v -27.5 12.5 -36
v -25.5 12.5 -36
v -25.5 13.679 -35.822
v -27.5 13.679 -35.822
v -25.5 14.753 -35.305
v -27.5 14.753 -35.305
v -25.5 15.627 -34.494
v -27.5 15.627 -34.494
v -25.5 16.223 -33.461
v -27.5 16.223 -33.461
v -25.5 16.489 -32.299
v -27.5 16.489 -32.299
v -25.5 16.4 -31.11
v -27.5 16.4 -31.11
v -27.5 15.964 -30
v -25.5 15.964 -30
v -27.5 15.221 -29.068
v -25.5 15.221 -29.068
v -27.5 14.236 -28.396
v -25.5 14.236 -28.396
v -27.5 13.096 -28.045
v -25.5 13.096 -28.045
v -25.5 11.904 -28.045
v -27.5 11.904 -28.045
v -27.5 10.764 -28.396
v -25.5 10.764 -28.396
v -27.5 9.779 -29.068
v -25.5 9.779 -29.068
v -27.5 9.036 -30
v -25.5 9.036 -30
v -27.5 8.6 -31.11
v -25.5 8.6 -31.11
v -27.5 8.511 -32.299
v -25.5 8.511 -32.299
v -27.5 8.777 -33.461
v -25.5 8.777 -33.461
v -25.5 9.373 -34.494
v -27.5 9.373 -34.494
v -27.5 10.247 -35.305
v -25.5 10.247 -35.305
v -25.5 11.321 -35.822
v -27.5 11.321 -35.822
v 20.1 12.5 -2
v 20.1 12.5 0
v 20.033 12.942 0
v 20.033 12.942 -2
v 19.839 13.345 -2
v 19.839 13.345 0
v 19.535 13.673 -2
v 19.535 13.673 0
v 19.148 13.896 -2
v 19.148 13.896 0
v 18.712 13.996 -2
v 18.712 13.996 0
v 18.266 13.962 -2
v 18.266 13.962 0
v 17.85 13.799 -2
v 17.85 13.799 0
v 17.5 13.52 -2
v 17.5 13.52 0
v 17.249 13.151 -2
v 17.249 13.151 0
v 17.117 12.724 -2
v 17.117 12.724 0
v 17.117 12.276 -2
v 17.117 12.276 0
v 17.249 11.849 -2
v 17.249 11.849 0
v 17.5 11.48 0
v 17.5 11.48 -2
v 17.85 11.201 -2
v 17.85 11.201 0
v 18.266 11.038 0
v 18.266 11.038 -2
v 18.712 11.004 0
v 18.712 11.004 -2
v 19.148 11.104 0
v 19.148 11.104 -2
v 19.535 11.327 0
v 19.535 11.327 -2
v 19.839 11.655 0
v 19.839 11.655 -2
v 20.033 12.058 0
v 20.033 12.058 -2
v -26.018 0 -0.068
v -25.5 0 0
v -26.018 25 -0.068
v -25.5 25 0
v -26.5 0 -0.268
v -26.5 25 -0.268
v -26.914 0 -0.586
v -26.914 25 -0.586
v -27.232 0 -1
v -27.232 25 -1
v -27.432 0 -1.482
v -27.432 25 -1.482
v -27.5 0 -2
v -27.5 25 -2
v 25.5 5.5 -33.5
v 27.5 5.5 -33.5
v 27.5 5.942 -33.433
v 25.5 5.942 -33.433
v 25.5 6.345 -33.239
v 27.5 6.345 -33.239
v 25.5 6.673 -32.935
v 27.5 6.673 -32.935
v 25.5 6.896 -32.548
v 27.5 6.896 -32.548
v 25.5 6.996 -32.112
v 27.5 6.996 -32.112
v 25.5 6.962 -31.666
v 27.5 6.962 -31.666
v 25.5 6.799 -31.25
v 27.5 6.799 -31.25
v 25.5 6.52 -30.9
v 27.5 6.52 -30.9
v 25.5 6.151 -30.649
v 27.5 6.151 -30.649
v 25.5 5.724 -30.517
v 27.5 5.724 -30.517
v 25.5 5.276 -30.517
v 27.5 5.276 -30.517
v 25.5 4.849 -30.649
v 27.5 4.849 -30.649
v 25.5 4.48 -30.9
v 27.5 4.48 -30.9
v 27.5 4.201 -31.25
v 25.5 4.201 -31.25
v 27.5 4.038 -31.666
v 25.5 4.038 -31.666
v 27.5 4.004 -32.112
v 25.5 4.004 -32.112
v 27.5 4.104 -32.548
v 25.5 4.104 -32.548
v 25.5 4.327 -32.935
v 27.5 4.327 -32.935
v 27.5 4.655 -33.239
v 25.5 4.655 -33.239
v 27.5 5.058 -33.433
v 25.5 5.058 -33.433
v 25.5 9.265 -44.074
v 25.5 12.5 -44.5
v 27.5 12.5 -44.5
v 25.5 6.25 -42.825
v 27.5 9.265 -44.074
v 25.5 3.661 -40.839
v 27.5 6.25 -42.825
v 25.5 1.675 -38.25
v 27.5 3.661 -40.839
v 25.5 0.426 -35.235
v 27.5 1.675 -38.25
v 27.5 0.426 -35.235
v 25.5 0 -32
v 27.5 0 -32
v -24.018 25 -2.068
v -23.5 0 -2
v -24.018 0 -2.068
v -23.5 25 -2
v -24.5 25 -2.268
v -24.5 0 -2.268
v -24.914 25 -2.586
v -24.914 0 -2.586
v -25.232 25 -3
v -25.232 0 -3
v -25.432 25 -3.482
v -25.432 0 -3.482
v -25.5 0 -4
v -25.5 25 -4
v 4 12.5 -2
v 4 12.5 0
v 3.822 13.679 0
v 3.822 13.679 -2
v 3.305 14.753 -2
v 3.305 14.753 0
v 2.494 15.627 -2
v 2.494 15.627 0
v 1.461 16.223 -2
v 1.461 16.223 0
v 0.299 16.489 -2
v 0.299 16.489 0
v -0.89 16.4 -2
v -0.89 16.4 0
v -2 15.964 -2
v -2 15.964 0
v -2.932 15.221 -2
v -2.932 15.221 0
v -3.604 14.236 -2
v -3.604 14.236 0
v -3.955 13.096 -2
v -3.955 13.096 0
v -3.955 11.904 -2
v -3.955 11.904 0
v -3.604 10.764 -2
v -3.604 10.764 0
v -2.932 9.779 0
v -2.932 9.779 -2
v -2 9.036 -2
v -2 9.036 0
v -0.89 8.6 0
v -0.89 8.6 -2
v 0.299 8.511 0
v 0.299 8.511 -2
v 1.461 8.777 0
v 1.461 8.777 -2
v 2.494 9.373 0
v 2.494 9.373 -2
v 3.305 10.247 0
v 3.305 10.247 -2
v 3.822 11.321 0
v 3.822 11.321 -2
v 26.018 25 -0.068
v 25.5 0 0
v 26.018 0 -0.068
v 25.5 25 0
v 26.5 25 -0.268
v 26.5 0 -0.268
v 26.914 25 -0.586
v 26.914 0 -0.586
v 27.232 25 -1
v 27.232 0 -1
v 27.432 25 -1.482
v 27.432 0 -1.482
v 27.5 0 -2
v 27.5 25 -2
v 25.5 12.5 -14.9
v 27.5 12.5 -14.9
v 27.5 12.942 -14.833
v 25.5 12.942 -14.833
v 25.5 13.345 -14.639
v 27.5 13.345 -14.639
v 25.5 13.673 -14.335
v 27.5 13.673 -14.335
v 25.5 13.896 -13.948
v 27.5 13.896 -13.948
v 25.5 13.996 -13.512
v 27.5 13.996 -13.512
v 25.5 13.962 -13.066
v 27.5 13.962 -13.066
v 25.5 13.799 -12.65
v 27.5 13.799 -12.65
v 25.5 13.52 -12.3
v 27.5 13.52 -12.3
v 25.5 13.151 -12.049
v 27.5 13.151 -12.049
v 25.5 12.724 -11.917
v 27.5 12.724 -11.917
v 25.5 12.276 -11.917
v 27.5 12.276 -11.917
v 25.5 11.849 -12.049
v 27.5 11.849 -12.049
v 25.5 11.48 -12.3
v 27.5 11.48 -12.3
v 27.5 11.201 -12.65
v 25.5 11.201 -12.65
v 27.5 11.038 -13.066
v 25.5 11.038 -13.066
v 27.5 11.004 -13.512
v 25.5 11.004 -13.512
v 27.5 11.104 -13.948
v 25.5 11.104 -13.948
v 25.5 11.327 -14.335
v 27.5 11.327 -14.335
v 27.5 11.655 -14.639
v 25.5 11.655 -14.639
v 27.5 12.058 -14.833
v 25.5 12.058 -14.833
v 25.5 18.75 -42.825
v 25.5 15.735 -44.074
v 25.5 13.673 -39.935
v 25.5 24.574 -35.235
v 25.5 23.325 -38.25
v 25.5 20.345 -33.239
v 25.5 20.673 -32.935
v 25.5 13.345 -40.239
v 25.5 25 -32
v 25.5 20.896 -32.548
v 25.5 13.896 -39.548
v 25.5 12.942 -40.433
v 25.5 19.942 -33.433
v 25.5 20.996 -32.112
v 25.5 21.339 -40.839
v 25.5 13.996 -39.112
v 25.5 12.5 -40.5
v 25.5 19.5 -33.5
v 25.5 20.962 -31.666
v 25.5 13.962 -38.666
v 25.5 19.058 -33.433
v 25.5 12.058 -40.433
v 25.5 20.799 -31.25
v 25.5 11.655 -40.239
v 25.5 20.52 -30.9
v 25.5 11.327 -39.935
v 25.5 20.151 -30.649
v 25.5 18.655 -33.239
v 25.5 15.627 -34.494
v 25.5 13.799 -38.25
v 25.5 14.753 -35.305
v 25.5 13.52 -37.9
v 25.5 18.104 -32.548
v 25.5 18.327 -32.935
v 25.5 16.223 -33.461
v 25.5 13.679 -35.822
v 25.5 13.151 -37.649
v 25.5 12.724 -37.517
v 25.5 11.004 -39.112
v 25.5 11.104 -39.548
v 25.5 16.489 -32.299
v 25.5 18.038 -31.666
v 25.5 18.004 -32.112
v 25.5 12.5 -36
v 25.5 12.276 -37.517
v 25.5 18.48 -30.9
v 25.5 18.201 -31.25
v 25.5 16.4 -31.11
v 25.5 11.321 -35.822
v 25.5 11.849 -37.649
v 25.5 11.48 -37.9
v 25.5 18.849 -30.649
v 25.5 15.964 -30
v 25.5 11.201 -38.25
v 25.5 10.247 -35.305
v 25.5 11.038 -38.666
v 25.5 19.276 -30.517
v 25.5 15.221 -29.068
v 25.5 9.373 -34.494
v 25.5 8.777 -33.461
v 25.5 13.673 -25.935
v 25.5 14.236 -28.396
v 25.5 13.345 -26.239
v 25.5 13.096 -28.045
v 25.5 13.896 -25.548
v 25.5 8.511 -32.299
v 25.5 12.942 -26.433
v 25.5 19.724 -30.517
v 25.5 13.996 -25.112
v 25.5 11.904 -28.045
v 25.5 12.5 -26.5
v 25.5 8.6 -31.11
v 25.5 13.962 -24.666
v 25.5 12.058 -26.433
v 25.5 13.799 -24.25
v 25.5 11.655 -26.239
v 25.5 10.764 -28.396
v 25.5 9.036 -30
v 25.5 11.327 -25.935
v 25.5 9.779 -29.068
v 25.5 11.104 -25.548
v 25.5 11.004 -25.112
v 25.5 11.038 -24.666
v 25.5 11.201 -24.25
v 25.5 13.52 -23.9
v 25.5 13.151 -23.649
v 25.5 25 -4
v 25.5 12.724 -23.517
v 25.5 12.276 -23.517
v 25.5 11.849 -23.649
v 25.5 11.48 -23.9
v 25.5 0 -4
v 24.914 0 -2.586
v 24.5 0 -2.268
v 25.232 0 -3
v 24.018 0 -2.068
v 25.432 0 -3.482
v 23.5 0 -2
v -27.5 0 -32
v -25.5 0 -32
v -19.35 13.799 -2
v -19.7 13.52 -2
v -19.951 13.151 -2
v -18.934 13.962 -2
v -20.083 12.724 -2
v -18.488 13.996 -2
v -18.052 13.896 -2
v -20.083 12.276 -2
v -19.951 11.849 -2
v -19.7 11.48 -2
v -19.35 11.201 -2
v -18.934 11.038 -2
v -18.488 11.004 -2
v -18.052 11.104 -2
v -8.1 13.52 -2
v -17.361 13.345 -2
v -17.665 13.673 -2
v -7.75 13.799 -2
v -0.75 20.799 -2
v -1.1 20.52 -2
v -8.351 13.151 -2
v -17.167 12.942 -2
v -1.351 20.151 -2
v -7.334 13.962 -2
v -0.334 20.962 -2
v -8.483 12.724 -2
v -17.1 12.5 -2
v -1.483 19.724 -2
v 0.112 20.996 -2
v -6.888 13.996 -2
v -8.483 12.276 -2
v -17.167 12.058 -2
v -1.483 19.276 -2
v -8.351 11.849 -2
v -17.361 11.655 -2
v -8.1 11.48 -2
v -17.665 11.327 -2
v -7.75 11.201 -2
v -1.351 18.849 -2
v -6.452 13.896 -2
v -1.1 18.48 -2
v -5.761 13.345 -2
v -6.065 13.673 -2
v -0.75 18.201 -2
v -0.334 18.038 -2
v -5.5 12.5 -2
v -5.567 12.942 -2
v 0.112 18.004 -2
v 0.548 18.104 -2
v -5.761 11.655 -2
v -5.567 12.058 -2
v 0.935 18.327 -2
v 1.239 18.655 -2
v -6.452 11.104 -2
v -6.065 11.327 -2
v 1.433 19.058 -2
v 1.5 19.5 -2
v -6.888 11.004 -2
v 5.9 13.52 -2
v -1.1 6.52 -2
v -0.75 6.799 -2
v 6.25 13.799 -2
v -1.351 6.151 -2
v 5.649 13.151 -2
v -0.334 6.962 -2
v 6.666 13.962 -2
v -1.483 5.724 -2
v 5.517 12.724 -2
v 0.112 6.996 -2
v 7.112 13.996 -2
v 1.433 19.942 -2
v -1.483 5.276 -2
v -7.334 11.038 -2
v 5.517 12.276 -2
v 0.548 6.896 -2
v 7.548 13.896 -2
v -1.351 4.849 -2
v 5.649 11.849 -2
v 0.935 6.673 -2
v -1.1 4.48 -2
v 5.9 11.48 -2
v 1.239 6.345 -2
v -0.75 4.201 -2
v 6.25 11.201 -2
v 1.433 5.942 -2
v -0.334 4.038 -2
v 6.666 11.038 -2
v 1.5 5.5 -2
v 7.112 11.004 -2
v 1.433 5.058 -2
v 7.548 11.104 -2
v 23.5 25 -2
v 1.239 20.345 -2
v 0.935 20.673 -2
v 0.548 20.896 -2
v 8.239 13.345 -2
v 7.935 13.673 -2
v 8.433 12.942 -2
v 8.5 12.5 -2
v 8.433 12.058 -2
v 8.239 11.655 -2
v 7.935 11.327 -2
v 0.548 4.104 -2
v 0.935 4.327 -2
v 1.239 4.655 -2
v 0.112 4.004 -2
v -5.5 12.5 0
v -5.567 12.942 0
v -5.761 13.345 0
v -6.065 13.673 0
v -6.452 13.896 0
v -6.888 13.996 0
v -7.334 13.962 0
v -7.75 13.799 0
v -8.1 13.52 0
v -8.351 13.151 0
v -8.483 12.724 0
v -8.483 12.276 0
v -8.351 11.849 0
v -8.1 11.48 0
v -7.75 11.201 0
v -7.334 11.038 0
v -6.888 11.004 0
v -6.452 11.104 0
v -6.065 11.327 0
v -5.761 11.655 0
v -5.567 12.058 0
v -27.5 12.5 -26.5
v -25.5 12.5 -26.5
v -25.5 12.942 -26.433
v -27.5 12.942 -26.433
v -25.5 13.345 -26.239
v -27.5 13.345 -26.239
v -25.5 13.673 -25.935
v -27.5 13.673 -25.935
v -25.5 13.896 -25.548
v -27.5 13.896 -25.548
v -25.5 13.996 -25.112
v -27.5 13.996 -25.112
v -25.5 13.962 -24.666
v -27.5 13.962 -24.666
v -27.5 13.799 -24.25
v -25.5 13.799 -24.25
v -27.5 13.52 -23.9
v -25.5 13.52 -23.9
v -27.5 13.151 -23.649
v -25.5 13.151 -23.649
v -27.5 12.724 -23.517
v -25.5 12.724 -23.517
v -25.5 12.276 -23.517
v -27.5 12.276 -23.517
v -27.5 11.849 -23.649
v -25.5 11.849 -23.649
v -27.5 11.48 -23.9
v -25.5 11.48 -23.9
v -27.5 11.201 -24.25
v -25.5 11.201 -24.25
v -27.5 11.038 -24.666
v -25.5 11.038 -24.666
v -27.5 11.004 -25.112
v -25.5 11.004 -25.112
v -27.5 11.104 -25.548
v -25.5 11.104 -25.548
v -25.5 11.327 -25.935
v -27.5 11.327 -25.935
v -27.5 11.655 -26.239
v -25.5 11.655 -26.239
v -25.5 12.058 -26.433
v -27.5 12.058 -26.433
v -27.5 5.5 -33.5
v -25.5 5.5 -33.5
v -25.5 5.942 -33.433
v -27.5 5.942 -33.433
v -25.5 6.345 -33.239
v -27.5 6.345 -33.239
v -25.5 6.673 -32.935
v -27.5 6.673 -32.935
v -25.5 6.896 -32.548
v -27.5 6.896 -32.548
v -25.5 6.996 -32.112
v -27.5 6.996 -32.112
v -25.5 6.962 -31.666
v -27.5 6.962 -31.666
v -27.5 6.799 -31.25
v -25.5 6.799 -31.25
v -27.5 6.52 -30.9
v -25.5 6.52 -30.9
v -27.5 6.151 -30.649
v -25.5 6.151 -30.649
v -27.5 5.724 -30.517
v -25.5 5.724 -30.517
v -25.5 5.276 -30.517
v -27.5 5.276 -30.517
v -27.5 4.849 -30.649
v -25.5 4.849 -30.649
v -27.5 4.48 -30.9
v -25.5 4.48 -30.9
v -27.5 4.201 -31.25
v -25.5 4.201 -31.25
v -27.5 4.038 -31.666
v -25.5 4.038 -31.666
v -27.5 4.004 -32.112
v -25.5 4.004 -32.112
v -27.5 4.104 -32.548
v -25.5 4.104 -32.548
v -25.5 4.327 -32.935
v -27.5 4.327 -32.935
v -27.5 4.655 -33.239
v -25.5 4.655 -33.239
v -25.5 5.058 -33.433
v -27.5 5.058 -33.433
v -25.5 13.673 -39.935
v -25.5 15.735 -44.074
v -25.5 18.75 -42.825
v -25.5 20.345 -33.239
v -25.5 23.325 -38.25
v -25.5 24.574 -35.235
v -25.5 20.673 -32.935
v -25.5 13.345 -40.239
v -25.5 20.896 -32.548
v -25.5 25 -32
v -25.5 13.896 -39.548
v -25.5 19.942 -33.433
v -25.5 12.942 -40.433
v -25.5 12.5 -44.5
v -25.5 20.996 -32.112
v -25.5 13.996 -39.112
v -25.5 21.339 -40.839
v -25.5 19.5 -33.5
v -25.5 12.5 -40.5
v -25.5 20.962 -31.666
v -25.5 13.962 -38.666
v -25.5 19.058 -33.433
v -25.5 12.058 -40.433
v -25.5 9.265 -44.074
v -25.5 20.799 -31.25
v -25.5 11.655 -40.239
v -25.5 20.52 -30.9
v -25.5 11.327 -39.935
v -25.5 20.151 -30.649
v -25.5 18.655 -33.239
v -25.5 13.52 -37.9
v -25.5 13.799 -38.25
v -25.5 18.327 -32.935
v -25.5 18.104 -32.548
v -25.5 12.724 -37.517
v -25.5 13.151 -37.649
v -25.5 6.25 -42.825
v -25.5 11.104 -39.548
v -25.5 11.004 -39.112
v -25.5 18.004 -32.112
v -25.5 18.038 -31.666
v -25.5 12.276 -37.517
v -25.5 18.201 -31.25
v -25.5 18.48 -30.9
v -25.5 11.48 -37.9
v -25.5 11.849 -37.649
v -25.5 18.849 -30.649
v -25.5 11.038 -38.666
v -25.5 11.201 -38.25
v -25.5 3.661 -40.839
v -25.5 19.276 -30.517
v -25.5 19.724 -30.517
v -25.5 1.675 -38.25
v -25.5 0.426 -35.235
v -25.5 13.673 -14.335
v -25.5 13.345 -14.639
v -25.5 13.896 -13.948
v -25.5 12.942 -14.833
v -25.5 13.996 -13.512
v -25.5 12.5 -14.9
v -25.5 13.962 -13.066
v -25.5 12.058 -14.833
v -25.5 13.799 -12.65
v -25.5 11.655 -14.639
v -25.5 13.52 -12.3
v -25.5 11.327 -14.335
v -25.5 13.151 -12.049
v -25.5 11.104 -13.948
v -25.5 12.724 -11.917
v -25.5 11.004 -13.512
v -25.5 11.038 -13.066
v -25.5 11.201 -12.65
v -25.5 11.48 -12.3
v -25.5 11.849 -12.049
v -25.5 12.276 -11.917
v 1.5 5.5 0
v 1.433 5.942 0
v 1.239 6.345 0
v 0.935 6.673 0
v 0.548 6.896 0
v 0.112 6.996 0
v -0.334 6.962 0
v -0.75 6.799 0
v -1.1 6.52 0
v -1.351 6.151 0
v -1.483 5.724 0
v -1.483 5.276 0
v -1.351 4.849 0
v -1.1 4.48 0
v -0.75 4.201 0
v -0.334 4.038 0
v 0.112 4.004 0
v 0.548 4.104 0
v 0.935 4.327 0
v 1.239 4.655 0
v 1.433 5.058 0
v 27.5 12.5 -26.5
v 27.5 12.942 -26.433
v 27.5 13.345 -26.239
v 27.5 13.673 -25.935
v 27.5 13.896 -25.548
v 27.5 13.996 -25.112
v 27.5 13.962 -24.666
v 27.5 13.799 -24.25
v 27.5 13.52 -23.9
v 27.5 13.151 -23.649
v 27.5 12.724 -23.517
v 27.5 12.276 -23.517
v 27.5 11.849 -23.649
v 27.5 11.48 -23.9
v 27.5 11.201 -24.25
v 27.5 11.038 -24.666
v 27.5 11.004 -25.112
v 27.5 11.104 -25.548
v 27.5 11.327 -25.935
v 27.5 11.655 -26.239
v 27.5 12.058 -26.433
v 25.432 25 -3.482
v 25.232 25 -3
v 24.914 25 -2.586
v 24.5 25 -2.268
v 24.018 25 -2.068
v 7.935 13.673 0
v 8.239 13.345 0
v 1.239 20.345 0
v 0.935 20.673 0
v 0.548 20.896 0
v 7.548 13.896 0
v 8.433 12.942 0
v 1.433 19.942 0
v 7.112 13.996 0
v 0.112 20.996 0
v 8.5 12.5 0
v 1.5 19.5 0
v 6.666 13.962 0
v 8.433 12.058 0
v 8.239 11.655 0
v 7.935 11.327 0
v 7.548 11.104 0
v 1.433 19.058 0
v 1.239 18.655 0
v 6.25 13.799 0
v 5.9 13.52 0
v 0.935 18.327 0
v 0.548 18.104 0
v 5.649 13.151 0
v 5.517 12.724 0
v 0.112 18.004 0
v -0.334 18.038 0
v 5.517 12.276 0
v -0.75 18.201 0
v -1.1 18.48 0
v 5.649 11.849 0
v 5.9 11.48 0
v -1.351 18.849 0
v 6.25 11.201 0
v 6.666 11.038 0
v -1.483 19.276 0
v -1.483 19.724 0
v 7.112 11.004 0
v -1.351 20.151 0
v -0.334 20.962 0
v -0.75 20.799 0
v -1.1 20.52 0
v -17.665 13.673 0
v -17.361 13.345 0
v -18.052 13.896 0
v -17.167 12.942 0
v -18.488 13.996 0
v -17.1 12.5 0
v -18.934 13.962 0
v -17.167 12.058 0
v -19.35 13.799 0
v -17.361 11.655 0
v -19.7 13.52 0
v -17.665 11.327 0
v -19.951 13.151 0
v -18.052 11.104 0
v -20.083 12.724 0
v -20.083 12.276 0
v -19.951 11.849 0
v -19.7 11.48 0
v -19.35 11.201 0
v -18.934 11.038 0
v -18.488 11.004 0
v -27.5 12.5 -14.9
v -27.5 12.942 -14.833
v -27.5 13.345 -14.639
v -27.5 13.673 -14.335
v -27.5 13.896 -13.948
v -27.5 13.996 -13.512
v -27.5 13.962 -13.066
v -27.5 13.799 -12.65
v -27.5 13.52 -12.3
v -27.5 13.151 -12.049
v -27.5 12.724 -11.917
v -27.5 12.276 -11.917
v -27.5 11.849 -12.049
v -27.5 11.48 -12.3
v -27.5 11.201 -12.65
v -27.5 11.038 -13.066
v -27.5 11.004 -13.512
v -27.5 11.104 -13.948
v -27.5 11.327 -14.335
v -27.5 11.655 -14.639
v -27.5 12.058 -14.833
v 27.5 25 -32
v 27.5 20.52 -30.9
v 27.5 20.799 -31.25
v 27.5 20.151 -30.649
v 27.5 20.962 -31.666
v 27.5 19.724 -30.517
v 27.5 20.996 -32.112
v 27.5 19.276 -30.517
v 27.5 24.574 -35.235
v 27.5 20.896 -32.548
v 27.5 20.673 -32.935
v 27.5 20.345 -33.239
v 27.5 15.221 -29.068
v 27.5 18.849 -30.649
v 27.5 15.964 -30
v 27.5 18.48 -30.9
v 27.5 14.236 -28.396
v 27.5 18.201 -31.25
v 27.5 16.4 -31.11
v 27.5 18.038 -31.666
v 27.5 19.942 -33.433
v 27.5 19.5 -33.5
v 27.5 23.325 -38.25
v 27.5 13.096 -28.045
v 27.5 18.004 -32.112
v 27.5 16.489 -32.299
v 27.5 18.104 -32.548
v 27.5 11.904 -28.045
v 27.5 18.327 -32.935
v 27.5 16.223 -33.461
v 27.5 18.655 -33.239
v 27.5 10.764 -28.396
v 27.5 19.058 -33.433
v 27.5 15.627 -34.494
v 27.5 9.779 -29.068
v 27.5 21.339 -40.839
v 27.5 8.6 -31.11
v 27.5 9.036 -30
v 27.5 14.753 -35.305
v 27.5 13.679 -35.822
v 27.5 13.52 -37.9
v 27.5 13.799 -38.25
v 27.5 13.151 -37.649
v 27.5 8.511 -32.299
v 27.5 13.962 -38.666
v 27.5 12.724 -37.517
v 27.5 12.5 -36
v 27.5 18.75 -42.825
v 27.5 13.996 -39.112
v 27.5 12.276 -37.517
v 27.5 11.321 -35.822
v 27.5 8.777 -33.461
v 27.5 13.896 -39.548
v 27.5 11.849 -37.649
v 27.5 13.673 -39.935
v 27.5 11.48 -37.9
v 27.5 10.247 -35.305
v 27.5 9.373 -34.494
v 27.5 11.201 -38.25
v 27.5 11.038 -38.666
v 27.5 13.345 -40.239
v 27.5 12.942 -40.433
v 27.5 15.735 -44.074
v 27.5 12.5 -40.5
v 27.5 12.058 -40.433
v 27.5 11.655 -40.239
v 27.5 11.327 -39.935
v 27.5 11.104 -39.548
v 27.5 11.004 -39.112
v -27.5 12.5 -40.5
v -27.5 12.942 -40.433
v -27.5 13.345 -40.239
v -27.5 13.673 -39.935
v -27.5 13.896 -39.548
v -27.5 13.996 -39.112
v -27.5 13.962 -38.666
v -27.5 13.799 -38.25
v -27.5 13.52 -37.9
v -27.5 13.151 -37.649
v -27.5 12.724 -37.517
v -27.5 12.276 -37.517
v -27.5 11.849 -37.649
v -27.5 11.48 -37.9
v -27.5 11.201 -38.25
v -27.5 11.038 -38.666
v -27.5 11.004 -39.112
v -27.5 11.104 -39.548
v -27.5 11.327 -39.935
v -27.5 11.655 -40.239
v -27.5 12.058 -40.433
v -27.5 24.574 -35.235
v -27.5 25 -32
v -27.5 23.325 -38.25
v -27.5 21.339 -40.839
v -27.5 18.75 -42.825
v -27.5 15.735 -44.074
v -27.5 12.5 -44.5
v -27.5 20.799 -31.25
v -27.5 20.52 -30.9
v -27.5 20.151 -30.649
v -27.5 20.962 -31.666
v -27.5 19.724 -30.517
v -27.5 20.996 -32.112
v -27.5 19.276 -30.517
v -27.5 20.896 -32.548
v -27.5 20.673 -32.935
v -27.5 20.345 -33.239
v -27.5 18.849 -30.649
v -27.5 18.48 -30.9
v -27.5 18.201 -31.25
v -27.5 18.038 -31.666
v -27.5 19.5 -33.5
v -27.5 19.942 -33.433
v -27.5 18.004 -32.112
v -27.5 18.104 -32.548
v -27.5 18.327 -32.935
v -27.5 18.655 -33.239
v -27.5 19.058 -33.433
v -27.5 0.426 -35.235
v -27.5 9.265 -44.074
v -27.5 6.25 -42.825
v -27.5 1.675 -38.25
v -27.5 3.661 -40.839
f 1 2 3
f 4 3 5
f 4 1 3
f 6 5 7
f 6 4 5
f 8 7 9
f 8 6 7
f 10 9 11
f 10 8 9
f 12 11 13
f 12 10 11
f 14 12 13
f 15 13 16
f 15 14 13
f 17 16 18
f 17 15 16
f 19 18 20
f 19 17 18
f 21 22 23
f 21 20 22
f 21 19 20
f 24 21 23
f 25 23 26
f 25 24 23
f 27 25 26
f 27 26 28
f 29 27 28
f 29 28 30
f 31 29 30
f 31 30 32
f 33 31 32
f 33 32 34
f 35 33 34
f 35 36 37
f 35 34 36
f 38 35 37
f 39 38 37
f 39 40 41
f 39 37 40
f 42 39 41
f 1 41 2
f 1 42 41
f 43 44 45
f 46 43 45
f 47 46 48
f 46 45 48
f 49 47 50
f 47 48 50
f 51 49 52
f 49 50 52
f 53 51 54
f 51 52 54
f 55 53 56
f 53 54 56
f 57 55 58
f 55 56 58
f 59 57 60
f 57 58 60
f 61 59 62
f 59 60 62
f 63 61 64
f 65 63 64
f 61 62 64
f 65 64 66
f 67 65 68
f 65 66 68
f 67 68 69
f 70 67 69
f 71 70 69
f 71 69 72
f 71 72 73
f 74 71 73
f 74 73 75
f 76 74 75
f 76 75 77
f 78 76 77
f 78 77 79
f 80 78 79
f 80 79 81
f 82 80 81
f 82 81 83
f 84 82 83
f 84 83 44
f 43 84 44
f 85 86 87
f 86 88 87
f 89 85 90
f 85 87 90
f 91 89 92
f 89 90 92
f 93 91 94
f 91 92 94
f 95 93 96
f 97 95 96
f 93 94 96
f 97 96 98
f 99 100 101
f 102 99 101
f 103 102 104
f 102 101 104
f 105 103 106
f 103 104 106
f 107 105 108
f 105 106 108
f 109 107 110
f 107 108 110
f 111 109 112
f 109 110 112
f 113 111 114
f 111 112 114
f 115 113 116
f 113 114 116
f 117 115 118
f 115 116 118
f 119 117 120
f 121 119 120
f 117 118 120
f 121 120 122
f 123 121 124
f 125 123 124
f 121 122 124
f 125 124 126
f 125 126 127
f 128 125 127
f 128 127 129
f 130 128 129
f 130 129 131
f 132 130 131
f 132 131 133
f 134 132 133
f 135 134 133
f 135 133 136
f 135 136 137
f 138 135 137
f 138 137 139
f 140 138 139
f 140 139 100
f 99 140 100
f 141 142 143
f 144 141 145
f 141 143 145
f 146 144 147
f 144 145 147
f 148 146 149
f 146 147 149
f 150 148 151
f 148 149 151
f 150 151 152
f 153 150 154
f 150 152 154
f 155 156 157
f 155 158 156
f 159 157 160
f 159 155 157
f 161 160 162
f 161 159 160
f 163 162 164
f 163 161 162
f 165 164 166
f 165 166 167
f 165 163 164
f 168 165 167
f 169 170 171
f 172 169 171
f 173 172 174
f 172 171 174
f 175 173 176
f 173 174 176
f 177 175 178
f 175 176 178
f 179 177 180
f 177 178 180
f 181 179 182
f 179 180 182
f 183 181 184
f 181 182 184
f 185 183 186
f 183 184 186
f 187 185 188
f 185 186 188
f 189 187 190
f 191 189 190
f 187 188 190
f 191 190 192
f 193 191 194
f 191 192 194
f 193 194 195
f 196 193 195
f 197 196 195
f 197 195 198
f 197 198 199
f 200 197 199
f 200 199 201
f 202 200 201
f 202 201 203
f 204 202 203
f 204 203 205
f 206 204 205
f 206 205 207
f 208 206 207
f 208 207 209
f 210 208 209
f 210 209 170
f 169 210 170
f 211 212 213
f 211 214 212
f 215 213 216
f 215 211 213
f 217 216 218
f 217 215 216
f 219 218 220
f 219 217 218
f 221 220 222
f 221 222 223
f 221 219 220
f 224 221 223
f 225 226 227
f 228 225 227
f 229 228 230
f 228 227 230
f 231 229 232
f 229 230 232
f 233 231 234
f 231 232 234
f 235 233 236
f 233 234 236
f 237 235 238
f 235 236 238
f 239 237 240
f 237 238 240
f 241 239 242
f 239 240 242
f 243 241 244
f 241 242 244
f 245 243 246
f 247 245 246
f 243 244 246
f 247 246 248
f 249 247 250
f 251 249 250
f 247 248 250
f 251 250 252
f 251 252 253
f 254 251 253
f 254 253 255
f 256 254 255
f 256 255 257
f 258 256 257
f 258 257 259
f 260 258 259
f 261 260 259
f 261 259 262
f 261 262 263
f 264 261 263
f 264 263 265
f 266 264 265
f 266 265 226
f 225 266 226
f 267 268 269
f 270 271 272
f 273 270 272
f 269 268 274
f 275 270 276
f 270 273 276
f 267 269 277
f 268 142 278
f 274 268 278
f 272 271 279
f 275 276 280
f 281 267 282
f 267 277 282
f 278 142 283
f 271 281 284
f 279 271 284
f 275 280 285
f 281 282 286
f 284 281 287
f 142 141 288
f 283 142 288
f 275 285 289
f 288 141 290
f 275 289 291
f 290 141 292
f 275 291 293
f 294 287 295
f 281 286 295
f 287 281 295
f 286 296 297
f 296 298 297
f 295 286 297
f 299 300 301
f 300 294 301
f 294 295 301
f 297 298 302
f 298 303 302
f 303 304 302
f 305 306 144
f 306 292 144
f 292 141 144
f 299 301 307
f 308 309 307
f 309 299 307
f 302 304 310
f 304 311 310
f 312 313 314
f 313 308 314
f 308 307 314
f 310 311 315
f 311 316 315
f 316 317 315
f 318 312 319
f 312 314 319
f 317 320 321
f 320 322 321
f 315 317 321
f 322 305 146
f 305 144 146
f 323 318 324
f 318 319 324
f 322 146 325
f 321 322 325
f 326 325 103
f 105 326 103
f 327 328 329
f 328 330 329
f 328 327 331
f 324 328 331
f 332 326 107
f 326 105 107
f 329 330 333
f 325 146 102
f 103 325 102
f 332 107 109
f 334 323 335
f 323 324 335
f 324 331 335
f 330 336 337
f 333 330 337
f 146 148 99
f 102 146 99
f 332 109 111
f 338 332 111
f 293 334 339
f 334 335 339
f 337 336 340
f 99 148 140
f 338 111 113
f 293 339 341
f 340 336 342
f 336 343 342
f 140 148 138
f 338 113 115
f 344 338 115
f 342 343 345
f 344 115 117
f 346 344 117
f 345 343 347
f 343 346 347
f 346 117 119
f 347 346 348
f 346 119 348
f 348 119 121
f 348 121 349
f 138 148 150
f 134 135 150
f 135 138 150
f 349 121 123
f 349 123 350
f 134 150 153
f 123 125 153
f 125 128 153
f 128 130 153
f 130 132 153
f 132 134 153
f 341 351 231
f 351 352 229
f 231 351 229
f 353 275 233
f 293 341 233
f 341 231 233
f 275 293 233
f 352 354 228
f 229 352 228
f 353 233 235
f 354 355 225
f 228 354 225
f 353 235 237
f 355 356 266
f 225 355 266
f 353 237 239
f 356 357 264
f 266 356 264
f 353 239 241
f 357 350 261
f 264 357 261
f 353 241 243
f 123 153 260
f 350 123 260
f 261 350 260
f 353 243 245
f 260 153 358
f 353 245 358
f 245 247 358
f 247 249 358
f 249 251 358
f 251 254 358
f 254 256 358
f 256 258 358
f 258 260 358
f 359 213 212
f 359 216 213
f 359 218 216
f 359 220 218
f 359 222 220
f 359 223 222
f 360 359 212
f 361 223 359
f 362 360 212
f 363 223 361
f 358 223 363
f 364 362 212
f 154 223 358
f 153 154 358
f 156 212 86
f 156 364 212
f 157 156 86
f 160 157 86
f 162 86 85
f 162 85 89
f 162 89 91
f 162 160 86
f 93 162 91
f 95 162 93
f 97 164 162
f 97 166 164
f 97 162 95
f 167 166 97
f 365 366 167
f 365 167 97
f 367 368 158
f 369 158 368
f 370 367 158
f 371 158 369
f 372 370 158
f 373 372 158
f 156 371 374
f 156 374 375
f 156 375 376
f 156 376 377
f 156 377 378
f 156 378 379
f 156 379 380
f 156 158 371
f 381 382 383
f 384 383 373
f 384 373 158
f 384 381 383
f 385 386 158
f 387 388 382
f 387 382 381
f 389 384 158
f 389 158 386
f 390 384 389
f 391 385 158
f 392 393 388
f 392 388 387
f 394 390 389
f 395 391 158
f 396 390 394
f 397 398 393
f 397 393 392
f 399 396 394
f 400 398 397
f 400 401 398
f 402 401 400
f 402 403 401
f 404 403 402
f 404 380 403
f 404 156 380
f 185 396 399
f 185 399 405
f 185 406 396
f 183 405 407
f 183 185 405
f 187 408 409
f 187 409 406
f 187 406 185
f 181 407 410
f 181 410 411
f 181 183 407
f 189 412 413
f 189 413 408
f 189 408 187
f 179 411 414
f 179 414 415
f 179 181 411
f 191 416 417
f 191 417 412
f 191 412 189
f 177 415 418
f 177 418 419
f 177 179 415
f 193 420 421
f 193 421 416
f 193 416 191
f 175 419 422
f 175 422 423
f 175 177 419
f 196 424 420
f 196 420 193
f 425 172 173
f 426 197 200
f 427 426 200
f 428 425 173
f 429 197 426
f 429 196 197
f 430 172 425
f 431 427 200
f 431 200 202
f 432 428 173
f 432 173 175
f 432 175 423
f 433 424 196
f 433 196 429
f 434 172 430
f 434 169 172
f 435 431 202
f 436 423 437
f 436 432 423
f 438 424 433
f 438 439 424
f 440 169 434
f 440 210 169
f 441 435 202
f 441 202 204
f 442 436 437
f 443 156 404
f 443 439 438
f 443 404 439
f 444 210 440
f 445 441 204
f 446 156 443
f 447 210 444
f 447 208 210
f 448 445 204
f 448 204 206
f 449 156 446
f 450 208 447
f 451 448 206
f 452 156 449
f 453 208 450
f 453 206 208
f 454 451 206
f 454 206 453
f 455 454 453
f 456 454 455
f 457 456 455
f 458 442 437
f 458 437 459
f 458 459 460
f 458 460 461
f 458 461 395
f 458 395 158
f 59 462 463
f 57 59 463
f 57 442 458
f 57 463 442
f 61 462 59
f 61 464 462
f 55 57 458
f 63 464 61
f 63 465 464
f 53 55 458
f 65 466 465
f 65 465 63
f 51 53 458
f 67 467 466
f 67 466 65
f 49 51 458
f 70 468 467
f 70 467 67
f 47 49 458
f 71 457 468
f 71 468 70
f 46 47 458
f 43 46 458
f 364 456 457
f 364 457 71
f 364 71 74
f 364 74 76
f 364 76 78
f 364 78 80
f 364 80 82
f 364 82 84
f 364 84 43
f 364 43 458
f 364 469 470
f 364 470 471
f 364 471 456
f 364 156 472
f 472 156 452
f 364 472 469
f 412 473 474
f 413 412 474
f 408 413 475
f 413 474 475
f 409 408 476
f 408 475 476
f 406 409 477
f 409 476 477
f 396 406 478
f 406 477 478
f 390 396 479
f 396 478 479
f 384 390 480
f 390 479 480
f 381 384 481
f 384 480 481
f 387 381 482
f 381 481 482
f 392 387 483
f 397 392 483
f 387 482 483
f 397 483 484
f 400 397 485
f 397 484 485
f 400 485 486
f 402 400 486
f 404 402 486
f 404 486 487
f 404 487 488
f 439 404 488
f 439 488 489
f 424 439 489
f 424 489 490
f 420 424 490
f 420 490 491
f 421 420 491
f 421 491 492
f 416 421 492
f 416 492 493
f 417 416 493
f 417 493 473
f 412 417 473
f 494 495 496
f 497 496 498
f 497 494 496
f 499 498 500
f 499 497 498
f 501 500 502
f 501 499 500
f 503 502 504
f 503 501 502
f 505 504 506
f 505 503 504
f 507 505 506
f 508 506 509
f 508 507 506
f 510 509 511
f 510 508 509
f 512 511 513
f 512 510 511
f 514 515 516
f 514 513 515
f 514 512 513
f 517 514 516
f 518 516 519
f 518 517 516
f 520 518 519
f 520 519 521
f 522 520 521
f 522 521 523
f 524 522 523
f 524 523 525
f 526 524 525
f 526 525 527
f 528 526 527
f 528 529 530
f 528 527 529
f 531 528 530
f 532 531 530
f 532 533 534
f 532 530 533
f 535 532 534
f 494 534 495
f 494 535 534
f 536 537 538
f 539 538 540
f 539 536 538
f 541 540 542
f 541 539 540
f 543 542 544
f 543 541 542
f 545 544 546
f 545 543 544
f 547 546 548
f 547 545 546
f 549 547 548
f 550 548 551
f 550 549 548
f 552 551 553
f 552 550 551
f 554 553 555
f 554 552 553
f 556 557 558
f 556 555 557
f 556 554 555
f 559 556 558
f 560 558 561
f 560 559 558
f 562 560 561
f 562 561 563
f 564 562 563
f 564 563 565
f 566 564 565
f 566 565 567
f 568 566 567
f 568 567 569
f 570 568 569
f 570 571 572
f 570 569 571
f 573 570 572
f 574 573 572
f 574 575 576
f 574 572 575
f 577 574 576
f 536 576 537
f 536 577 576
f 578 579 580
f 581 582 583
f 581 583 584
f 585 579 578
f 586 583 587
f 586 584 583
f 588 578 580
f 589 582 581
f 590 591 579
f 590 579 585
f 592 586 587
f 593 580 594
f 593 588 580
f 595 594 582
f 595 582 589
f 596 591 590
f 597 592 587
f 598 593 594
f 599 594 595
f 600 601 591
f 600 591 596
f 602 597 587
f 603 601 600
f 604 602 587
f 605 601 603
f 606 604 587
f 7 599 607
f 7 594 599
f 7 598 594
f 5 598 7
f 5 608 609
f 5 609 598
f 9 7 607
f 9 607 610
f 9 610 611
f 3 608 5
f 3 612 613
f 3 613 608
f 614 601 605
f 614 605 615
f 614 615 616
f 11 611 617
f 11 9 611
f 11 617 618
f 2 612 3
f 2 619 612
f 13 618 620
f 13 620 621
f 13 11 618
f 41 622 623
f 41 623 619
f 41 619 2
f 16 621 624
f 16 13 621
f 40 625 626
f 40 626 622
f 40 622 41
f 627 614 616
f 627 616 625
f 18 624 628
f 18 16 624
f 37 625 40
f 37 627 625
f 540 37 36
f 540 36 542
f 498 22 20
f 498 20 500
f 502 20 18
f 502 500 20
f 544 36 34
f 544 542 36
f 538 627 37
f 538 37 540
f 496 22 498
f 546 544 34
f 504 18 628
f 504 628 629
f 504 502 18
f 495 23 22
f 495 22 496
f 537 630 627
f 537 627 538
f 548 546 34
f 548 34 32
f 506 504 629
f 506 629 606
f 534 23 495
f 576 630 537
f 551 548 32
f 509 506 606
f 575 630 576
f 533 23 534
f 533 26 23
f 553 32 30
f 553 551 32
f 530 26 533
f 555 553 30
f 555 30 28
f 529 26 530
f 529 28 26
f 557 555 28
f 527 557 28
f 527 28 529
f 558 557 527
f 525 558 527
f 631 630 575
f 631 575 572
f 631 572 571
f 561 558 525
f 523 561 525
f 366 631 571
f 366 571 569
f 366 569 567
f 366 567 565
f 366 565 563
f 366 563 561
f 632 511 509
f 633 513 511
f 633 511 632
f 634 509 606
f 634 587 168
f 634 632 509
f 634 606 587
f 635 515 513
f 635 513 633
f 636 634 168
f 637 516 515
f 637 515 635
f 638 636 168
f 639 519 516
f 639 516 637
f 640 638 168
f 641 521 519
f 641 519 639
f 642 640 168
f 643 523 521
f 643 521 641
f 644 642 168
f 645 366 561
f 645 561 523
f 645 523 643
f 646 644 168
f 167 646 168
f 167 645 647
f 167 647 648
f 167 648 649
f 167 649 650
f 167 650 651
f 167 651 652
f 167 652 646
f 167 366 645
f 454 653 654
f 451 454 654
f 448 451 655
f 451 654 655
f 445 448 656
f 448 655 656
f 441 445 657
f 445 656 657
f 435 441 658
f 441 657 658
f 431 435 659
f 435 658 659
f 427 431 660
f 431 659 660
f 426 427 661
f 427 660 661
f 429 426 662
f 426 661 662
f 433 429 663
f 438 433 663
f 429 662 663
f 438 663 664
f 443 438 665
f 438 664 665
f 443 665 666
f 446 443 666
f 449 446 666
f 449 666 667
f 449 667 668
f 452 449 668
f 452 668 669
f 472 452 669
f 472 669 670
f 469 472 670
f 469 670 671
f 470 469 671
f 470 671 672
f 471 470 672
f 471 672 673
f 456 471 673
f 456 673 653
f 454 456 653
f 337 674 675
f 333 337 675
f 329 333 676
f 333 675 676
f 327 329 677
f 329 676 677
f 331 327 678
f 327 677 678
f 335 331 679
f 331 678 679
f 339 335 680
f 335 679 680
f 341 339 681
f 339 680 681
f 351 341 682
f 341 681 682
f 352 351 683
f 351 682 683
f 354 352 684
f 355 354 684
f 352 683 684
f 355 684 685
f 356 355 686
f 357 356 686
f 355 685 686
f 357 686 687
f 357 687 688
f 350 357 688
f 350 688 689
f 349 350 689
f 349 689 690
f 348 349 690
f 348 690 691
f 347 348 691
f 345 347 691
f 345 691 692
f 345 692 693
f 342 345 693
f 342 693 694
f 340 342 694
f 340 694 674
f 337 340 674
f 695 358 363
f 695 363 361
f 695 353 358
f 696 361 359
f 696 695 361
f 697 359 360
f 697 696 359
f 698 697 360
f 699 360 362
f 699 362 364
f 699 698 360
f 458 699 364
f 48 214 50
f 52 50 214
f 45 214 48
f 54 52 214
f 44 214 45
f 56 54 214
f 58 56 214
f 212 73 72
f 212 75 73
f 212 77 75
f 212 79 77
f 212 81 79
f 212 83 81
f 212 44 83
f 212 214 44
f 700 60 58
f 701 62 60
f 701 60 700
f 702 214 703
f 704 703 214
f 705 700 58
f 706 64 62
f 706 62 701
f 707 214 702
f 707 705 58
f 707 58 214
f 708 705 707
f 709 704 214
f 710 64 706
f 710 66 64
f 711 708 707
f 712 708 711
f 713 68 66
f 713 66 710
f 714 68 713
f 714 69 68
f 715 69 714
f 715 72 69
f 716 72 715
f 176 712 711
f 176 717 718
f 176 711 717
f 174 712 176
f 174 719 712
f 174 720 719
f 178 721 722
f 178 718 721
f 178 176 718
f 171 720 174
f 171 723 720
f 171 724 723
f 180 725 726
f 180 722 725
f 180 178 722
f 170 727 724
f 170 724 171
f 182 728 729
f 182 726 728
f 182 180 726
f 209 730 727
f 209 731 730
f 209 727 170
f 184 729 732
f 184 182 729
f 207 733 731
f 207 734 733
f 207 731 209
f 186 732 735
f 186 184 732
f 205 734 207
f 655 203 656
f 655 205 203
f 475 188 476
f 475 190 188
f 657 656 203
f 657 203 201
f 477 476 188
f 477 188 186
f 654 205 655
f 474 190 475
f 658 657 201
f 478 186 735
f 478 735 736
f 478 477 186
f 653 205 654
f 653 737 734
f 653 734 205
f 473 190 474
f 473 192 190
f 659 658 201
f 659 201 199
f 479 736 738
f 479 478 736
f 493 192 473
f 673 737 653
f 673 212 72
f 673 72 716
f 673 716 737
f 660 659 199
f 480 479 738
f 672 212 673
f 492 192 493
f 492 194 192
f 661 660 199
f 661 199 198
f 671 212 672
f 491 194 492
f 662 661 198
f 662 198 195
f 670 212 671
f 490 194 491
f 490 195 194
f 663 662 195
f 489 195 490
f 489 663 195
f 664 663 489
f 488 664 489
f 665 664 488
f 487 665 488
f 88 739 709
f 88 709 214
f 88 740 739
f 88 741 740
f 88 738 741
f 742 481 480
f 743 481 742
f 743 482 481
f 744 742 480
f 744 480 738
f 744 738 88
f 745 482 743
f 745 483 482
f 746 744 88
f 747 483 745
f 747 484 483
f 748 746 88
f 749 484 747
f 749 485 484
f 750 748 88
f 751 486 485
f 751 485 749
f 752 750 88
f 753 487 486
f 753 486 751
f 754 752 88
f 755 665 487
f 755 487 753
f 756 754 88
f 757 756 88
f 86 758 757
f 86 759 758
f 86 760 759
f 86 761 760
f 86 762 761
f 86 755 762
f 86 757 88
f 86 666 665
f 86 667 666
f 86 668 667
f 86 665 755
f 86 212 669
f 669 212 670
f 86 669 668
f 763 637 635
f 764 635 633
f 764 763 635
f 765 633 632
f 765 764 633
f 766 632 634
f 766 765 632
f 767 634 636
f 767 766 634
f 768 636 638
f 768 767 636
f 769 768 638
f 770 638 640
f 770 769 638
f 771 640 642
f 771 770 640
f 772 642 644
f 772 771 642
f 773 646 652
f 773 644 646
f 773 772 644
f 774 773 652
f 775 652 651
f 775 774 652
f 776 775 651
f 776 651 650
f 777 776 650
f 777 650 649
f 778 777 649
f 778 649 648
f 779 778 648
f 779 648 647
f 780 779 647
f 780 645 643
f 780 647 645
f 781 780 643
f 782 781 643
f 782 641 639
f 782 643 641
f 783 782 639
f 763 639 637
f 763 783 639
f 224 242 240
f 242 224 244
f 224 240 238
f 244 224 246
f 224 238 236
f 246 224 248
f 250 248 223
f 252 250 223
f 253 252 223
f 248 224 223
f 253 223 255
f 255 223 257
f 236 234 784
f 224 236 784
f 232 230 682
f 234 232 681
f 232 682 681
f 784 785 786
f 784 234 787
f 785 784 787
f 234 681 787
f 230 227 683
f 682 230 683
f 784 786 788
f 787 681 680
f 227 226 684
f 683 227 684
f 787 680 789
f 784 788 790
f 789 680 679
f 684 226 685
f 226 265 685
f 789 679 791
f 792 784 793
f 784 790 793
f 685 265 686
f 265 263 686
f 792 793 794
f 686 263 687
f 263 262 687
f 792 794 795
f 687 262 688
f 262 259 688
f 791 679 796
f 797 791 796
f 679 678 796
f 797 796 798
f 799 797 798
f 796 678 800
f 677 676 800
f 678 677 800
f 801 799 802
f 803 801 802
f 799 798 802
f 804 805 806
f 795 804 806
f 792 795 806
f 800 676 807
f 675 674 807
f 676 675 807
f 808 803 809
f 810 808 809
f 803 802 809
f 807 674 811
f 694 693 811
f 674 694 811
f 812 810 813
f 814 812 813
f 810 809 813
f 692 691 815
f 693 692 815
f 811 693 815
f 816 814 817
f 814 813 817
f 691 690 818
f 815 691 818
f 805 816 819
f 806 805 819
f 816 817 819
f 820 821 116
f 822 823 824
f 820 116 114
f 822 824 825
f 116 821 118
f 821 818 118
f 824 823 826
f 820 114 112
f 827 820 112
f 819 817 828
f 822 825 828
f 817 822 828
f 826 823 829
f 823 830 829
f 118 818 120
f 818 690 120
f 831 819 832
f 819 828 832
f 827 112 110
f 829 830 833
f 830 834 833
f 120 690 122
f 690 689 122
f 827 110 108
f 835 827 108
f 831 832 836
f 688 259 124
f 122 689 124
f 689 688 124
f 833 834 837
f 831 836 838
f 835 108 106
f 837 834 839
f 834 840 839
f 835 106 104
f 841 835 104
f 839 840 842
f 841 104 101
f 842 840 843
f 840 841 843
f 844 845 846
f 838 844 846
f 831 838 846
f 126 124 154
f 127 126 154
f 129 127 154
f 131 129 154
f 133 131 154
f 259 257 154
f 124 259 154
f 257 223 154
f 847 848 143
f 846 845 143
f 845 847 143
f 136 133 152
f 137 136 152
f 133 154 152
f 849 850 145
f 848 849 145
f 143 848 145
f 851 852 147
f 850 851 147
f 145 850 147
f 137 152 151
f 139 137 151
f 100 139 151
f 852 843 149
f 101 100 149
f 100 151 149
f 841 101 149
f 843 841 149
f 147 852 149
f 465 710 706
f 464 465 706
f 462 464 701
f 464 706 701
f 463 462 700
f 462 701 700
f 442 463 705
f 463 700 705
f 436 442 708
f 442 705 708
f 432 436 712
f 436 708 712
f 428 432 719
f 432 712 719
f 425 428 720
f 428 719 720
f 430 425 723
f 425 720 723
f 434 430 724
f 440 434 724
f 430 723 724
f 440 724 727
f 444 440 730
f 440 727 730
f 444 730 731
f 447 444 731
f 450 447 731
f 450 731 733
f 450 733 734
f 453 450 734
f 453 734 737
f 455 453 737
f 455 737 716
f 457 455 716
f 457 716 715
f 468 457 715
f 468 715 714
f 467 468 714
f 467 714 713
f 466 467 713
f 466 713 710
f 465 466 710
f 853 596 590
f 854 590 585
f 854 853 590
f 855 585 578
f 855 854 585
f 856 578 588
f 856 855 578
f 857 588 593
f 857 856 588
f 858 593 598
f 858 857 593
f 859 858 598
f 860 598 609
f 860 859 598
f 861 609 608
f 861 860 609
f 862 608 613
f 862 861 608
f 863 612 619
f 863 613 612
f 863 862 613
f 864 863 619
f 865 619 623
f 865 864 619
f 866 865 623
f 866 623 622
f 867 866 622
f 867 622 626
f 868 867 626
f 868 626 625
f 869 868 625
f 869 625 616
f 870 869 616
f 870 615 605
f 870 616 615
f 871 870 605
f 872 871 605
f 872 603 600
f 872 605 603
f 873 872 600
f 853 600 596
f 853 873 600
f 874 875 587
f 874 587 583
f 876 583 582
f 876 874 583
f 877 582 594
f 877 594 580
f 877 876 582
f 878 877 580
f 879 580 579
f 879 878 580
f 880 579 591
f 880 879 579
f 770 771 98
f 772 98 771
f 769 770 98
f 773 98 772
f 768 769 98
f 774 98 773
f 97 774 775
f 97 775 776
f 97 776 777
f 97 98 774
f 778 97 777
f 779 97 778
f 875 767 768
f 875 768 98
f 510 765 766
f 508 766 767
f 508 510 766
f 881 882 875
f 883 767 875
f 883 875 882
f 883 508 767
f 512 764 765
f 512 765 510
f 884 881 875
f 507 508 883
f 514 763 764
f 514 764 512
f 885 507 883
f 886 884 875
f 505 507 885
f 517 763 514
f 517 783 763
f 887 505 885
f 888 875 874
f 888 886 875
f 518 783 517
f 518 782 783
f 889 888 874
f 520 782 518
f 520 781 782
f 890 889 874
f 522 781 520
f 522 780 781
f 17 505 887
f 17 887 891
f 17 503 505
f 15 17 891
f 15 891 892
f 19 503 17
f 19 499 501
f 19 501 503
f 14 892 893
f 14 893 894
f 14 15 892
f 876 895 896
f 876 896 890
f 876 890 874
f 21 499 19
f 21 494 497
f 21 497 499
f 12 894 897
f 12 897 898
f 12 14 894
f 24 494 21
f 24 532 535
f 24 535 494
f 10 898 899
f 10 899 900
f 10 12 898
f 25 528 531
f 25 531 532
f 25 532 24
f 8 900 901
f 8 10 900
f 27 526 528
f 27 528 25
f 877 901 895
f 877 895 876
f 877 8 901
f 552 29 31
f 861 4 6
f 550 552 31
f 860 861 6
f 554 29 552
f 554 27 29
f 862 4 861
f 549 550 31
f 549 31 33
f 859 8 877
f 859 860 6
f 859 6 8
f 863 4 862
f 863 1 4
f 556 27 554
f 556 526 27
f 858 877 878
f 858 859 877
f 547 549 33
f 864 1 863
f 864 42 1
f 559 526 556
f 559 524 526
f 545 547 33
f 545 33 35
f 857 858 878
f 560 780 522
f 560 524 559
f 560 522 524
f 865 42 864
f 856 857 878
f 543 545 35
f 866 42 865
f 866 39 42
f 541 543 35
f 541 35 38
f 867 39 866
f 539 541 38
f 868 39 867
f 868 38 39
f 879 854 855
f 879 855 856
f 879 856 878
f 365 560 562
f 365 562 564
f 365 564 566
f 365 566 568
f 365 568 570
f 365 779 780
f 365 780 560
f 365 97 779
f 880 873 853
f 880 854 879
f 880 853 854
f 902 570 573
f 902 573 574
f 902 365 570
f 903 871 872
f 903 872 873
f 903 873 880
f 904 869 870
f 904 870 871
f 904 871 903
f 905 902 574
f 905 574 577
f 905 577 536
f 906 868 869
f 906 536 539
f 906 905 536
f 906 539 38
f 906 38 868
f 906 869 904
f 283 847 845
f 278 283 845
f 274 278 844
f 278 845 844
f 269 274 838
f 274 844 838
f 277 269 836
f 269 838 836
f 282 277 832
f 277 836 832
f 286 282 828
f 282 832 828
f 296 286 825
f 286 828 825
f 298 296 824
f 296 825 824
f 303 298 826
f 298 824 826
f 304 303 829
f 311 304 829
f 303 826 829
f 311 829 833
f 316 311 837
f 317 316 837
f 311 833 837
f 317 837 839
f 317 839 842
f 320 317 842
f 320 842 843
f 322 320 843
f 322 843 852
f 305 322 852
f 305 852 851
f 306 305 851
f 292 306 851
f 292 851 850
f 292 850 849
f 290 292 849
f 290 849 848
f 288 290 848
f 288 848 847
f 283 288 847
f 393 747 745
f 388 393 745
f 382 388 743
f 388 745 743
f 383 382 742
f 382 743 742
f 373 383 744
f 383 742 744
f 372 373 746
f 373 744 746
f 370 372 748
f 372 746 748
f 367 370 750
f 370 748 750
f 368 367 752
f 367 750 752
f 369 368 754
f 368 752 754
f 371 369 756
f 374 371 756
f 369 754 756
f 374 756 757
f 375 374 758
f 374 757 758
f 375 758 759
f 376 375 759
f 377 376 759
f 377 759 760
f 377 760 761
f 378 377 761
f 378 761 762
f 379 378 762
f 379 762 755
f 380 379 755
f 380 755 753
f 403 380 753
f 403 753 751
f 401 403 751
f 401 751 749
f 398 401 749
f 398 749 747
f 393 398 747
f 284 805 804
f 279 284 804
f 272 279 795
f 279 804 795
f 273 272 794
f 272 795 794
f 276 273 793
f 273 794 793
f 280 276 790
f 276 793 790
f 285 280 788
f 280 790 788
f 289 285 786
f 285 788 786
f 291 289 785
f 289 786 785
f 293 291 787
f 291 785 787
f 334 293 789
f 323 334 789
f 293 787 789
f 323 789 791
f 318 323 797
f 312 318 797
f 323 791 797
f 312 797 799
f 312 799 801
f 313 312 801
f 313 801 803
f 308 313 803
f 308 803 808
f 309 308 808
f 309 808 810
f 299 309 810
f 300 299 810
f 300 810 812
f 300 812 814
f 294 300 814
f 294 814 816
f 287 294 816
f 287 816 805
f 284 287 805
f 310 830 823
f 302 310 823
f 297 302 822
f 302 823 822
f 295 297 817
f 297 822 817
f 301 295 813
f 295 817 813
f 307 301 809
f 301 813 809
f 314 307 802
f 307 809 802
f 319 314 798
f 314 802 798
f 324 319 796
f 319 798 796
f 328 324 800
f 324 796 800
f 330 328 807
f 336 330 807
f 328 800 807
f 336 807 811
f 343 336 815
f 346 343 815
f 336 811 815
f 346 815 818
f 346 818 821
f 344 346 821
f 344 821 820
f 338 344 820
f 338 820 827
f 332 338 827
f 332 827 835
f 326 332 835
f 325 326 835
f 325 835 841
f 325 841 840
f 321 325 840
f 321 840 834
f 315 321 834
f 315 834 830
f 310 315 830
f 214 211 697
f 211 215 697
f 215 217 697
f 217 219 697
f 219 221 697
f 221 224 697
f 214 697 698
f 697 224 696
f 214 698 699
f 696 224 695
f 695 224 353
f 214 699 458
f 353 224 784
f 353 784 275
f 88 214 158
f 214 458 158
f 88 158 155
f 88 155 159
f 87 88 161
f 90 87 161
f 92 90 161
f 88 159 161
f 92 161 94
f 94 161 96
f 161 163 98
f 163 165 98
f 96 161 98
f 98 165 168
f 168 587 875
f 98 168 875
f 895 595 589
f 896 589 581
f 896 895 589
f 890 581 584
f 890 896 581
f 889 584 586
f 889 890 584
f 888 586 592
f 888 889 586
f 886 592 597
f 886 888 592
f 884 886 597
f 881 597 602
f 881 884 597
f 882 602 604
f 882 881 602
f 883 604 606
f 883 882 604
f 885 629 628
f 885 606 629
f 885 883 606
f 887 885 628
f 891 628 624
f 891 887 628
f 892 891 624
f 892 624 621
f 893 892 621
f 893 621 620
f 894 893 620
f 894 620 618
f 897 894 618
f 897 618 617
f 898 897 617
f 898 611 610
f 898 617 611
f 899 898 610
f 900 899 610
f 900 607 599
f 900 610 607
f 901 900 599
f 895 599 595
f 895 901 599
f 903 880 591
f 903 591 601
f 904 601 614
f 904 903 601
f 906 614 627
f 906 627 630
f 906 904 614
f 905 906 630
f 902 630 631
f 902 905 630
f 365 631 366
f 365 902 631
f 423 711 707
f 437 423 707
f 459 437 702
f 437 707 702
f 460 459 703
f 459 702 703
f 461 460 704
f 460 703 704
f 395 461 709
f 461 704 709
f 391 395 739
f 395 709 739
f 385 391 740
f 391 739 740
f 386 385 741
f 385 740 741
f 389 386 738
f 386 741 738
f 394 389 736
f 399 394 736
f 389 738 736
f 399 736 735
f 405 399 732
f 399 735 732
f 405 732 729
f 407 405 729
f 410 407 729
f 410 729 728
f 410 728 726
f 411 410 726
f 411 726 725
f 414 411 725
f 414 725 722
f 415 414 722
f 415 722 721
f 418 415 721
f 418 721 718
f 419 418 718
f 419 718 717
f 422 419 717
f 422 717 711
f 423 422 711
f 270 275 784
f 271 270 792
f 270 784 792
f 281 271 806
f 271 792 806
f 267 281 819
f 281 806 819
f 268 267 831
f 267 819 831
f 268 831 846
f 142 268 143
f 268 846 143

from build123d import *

# Parameters (mm, degrees)
EXTRUDE_1_DEPTH     = 25
SKETCH_2_R          = 1.5
SKETCH_2_R_2        = 4
CUT_EXTRUDE_1_DEPTH = 25
SKETCH_3_R          = 1.5
SKETCH_3_R_2        = 4
CUT_EXTRUDE_2_DEPTH = 25
FILLET_1_R          = 2


with BuildPart() as part:
    # 草图1 → 凸台-拉伸1 (new body)
    with BuildSketch(Plane(origin=(0, 0, 0), x_dir=(1, 0, 0), z_dir=(0, 1, 0))):
        Polygon((0, 0), (27.5, 0), (27.5, 44.5), (25.5, 44.5), (25.5, 2), (0, 2), align=None)
    extrude_1 = extrude(amount=EXTRUDE_1_DEPTH)

    # 草图2 → 切除-拉伸1 (cut)
    with BuildSketch(Plane(origin=(27.5, 0, 0), x_dir=(0, 0, -1), z_dir=(1, 0, 0))):
        with Locations((13.4, 12.5)):
            Circle(SKETCH_2_R)
        with Locations((32, 12.5)):
            Circle(SKETCH_2_R_2)
        with Locations((32, 19.5)):
            Circle(SKETCH_2_R)
        with Locations((39, 12.5)):
            Circle(SKETCH_2_R)
        with Locations((32, 5.5)):
            Circle(SKETCH_2_R)
        with BuildLine():
            ThreePointArc((44.5, 12.5), (40.838834765, 3.661165235), (32, 0))
            Line((32, 0), (44.5, 0))
            Line((44.5, 0), (44.5, 12.5))
        make_face()
        with BuildLine():
            ThreePointArc((32, 25), (40.838834765, 21.338834765), (44.5, 12.5))
            Line((44.5, 12.5), (44.5, 25))
            Line((44.5, 25), (32, 25))
        make_face()
        with Locations((25, 12.5)):
            Circle(SKETCH_2_R)
    cut_extrude_1 = extrude(amount=-CUT_EXTRUDE_1_DEPTH, mode=Mode.SUBTRACT)

    # 镜向1: 凸台-拉伸1, 切除-拉伸1 across plane
    add(extrude_1.mirror(Plane(origin=(0, 25, -2), x_dir=(0, 0, 1), z_dir=(1, 0, 0))))
    add(cut_extrude_1.mirror(Plane(origin=(0, 25, -2), x_dir=(0, 0, 1), z_dir=(1, 0, 0))), mode=Mode.SUBTRACT)

    # 草图3 → 切除-拉伸2 (cut)
    with BuildSketch(Plane.XY):
        with Locations((0, 19.5)):
            Circle(SKETCH_3_R)
        with Locations((7, 12.5)):
            Circle(SKETCH_3_R)
        with Locations((0, 5.5)):
            Circle(SKETCH_3_R)
        with Locations((-7, 12.5)):
            Circle(SKETCH_3_R)
        with Locations((-18.6, 12.5)):
            Circle(SKETCH_3_R)
        with Locations((0, 12.5)):
            Circle(SKETCH_3_R_2)
        with Locations((18.6, 12.5)):
            Circle(SKETCH_3_R)
    extrude(amount=-CUT_EXTRUDE_2_DEPTH, mode=Mode.SUBTRACT)

    # 圆角1
    fillet_1_edges = [part.edges().sort_by_distance(p)[0] for p in [
        (25.5, 12.5, -2),
        (27.5, 12.5, 0),
        (-25.5, 12.5, -2),
        (-27.5, 12.5, 0),
    ]]
    fillet(fillet_1_edges, radius=FILLET_1_R)


solid = part.part
